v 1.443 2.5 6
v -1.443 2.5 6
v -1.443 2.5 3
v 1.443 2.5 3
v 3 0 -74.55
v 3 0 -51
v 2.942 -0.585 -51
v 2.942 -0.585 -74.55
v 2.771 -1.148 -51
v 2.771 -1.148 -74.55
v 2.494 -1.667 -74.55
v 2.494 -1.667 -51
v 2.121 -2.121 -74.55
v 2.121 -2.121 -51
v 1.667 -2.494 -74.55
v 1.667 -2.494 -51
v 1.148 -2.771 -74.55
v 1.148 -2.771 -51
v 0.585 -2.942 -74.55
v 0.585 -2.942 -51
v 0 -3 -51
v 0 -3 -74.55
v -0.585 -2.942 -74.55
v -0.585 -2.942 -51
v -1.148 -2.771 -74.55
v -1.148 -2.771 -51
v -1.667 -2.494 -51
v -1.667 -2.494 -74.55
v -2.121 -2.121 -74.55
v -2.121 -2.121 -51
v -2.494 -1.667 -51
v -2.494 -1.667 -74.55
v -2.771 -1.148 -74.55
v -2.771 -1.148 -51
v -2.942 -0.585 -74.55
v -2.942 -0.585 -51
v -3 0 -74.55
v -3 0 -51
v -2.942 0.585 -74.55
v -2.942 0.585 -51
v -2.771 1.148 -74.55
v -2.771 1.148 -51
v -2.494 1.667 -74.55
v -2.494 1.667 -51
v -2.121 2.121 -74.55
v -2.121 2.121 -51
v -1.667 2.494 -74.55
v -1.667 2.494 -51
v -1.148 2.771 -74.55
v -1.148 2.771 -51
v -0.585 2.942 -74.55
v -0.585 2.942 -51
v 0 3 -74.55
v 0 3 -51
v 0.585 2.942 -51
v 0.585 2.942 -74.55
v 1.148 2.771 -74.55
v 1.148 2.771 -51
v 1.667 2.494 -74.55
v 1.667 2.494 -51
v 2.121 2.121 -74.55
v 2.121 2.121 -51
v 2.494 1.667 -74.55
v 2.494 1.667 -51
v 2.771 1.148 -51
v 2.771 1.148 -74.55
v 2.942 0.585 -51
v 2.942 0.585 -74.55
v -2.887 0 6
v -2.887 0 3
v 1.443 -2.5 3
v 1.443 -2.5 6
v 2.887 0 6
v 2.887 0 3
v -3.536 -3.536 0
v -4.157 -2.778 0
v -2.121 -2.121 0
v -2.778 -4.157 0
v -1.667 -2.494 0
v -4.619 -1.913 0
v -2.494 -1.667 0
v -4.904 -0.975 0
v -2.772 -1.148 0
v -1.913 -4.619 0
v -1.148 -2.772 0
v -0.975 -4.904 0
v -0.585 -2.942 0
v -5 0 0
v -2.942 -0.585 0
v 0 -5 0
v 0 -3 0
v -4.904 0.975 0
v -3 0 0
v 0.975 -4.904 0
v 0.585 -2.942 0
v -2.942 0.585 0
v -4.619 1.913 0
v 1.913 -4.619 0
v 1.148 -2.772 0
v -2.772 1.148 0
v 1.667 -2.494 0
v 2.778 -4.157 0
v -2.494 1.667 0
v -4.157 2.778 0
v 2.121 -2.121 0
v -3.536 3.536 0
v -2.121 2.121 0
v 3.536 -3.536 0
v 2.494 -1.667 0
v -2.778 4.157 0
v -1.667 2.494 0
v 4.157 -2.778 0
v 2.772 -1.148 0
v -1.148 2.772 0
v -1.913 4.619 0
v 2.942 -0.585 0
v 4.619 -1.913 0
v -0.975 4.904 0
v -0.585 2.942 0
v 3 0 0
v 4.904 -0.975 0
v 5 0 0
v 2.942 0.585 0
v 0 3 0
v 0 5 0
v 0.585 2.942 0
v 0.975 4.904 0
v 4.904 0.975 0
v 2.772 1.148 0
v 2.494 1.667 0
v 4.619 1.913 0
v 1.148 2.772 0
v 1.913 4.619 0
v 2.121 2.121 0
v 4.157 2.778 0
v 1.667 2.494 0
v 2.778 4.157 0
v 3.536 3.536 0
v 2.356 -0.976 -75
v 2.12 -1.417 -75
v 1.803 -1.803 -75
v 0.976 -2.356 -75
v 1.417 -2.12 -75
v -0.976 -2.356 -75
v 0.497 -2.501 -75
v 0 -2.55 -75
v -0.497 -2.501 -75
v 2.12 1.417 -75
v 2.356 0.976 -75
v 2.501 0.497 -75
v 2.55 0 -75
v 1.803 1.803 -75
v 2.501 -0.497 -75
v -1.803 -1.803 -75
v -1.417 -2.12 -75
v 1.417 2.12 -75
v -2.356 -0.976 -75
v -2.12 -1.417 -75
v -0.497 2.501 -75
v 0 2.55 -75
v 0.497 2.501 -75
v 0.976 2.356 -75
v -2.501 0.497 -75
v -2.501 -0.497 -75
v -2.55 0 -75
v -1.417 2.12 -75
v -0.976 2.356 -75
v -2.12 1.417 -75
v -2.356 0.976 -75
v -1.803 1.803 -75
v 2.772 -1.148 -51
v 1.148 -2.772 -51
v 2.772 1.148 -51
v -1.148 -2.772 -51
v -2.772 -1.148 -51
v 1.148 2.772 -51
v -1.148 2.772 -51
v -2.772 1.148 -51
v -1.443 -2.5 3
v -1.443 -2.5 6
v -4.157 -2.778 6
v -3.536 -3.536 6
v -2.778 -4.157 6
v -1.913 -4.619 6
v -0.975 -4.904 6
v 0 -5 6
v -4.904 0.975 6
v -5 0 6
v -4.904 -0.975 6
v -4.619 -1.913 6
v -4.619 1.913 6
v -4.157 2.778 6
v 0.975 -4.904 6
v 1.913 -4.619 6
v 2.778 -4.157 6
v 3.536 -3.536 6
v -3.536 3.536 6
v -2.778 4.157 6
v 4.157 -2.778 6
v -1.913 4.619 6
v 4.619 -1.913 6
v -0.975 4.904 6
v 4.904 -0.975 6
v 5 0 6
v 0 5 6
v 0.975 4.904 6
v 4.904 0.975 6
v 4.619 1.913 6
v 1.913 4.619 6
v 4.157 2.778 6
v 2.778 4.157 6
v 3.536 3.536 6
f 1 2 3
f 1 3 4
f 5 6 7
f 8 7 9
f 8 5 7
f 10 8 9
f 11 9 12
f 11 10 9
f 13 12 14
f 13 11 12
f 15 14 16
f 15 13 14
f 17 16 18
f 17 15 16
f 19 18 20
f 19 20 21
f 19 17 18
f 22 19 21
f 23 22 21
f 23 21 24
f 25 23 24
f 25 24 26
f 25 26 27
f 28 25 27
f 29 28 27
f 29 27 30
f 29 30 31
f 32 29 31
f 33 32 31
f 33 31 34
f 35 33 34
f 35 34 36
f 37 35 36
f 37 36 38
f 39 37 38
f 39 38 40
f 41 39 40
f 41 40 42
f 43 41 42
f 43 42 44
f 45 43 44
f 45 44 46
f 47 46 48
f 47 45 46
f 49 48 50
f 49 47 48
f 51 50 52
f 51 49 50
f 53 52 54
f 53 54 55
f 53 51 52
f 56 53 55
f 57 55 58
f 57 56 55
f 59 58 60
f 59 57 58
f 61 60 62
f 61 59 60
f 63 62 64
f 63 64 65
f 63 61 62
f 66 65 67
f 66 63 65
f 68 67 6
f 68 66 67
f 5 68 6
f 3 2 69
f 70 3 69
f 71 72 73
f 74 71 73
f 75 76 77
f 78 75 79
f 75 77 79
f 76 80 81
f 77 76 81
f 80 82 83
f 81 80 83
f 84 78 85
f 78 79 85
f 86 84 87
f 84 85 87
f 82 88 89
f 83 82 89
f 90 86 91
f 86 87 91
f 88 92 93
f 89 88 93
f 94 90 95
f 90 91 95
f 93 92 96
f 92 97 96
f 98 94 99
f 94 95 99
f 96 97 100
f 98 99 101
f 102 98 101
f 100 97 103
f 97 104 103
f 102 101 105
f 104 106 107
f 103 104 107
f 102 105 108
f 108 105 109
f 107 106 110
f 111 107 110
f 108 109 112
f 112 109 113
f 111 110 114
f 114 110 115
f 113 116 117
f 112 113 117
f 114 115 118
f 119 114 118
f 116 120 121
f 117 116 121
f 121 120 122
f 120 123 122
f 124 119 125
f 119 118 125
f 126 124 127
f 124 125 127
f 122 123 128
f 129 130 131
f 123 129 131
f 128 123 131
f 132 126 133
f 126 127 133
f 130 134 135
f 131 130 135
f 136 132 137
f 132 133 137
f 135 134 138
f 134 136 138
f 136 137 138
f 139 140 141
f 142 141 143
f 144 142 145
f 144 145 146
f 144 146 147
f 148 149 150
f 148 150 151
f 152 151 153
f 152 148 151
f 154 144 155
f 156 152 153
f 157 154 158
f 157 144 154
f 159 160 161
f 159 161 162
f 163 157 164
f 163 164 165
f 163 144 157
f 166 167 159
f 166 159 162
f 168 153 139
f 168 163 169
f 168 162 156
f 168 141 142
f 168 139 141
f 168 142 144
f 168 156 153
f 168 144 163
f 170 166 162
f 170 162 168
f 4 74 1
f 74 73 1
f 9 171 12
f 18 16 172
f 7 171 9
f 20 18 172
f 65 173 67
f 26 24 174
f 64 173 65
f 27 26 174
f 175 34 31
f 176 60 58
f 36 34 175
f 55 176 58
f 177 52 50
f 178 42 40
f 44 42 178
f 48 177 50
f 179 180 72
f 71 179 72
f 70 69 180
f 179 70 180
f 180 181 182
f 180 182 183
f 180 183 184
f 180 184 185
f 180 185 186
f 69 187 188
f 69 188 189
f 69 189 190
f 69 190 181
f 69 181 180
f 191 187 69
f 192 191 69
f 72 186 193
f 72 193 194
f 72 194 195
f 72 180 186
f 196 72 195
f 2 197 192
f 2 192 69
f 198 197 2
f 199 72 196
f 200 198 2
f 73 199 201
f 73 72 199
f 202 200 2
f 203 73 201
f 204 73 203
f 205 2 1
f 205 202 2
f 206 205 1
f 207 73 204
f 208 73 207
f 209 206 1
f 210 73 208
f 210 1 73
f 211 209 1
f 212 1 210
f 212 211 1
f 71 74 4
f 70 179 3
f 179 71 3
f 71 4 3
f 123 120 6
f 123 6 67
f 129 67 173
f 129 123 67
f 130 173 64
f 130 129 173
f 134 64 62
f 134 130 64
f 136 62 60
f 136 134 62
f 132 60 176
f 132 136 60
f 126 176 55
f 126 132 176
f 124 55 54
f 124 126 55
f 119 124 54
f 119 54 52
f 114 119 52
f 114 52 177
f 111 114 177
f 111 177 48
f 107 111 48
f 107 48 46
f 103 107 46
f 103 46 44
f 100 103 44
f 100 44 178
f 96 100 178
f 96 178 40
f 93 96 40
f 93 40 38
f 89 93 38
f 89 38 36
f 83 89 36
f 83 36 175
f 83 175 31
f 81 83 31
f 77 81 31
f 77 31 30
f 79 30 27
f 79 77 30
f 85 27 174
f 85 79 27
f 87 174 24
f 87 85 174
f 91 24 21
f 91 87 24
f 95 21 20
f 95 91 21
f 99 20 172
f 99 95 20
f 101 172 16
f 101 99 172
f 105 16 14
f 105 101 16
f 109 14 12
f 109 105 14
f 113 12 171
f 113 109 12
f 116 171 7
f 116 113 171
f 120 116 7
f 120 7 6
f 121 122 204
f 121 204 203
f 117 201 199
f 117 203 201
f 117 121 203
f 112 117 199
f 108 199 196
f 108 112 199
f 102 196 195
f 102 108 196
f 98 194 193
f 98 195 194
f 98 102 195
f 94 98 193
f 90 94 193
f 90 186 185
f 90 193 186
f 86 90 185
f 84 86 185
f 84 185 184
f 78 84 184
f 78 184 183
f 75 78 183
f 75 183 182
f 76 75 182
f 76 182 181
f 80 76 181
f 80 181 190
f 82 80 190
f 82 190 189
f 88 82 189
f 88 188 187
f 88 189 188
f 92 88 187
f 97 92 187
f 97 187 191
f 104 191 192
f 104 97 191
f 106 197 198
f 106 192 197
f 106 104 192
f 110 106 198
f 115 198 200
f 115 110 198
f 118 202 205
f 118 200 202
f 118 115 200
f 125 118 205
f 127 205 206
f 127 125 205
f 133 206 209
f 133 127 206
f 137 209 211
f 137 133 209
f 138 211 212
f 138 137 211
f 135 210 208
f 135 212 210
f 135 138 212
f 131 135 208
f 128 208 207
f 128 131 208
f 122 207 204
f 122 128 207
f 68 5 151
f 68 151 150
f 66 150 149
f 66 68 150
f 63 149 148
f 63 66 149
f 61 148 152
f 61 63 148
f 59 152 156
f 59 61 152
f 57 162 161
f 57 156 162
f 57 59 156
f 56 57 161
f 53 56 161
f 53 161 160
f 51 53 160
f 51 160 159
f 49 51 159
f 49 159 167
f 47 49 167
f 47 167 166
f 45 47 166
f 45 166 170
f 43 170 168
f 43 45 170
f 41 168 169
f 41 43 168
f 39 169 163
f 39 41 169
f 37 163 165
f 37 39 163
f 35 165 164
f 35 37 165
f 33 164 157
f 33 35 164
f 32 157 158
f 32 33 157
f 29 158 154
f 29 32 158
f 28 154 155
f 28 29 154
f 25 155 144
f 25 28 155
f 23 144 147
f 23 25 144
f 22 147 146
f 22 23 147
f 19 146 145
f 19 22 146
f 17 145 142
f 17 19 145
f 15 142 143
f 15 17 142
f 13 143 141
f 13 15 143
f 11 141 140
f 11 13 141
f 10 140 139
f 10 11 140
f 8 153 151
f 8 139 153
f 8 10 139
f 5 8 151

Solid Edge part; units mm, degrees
sketch "Sketch1" plane through (0, 0, 0) normal (0, 0, 1) x (1, 0, 0)
  circle A0 centre (0, 0) radius 5
  dimension "D1" = 10
extrude "Protrusion1" add sketch "Sketch1" along normal blind 6
sketch "Sketch2" plane through (0, 0, 0) normal (0, 0, -1) x (1, 0, 0)
  circle A0 centre (0, 0) radius 3
extrude "Protrusion2" add sketch "Sketch2" along normal blind 75
sketch "Sketch3" plane through (0, 0, -75) normal (0, 0, -1) x (1, 0, 0)
  circle A0 centre (0, 0) radius 2.9997
extrude "Cutout1" cut sketch "Sketch3" against normal blind 24 flip side to cut
chamfer "Chamfer_1" distance 0.45 angle 45 1 edges at (-2.9997, 0, -75)
sketch "Sketch4" plane through (0, 0, 6) normal (0, 0, 1) x (1, 0, 0)
  line L0 (-1.4434, 2.5) -> (1.4434, 2.5)
  line L1 (2.8868, 0) -> (1.4434, 2.5)
  line L2 (1.4434, -2.5) -> (2.8868, 0)
  line L3 (-1.4434, -2.5) -> (1.4434, -2.5)
  line L4 (-2.8868, 0) -> (-1.4434, -2.5)
  line L5 (-1.4434, 2.5) -> (-2.8868, 0)
  dimension "D1" = 5
extrude "Cutout2" cut sketch "Sketch4" against normal blind 3
properties part number "185713" material "Stainless Steel, 304"
